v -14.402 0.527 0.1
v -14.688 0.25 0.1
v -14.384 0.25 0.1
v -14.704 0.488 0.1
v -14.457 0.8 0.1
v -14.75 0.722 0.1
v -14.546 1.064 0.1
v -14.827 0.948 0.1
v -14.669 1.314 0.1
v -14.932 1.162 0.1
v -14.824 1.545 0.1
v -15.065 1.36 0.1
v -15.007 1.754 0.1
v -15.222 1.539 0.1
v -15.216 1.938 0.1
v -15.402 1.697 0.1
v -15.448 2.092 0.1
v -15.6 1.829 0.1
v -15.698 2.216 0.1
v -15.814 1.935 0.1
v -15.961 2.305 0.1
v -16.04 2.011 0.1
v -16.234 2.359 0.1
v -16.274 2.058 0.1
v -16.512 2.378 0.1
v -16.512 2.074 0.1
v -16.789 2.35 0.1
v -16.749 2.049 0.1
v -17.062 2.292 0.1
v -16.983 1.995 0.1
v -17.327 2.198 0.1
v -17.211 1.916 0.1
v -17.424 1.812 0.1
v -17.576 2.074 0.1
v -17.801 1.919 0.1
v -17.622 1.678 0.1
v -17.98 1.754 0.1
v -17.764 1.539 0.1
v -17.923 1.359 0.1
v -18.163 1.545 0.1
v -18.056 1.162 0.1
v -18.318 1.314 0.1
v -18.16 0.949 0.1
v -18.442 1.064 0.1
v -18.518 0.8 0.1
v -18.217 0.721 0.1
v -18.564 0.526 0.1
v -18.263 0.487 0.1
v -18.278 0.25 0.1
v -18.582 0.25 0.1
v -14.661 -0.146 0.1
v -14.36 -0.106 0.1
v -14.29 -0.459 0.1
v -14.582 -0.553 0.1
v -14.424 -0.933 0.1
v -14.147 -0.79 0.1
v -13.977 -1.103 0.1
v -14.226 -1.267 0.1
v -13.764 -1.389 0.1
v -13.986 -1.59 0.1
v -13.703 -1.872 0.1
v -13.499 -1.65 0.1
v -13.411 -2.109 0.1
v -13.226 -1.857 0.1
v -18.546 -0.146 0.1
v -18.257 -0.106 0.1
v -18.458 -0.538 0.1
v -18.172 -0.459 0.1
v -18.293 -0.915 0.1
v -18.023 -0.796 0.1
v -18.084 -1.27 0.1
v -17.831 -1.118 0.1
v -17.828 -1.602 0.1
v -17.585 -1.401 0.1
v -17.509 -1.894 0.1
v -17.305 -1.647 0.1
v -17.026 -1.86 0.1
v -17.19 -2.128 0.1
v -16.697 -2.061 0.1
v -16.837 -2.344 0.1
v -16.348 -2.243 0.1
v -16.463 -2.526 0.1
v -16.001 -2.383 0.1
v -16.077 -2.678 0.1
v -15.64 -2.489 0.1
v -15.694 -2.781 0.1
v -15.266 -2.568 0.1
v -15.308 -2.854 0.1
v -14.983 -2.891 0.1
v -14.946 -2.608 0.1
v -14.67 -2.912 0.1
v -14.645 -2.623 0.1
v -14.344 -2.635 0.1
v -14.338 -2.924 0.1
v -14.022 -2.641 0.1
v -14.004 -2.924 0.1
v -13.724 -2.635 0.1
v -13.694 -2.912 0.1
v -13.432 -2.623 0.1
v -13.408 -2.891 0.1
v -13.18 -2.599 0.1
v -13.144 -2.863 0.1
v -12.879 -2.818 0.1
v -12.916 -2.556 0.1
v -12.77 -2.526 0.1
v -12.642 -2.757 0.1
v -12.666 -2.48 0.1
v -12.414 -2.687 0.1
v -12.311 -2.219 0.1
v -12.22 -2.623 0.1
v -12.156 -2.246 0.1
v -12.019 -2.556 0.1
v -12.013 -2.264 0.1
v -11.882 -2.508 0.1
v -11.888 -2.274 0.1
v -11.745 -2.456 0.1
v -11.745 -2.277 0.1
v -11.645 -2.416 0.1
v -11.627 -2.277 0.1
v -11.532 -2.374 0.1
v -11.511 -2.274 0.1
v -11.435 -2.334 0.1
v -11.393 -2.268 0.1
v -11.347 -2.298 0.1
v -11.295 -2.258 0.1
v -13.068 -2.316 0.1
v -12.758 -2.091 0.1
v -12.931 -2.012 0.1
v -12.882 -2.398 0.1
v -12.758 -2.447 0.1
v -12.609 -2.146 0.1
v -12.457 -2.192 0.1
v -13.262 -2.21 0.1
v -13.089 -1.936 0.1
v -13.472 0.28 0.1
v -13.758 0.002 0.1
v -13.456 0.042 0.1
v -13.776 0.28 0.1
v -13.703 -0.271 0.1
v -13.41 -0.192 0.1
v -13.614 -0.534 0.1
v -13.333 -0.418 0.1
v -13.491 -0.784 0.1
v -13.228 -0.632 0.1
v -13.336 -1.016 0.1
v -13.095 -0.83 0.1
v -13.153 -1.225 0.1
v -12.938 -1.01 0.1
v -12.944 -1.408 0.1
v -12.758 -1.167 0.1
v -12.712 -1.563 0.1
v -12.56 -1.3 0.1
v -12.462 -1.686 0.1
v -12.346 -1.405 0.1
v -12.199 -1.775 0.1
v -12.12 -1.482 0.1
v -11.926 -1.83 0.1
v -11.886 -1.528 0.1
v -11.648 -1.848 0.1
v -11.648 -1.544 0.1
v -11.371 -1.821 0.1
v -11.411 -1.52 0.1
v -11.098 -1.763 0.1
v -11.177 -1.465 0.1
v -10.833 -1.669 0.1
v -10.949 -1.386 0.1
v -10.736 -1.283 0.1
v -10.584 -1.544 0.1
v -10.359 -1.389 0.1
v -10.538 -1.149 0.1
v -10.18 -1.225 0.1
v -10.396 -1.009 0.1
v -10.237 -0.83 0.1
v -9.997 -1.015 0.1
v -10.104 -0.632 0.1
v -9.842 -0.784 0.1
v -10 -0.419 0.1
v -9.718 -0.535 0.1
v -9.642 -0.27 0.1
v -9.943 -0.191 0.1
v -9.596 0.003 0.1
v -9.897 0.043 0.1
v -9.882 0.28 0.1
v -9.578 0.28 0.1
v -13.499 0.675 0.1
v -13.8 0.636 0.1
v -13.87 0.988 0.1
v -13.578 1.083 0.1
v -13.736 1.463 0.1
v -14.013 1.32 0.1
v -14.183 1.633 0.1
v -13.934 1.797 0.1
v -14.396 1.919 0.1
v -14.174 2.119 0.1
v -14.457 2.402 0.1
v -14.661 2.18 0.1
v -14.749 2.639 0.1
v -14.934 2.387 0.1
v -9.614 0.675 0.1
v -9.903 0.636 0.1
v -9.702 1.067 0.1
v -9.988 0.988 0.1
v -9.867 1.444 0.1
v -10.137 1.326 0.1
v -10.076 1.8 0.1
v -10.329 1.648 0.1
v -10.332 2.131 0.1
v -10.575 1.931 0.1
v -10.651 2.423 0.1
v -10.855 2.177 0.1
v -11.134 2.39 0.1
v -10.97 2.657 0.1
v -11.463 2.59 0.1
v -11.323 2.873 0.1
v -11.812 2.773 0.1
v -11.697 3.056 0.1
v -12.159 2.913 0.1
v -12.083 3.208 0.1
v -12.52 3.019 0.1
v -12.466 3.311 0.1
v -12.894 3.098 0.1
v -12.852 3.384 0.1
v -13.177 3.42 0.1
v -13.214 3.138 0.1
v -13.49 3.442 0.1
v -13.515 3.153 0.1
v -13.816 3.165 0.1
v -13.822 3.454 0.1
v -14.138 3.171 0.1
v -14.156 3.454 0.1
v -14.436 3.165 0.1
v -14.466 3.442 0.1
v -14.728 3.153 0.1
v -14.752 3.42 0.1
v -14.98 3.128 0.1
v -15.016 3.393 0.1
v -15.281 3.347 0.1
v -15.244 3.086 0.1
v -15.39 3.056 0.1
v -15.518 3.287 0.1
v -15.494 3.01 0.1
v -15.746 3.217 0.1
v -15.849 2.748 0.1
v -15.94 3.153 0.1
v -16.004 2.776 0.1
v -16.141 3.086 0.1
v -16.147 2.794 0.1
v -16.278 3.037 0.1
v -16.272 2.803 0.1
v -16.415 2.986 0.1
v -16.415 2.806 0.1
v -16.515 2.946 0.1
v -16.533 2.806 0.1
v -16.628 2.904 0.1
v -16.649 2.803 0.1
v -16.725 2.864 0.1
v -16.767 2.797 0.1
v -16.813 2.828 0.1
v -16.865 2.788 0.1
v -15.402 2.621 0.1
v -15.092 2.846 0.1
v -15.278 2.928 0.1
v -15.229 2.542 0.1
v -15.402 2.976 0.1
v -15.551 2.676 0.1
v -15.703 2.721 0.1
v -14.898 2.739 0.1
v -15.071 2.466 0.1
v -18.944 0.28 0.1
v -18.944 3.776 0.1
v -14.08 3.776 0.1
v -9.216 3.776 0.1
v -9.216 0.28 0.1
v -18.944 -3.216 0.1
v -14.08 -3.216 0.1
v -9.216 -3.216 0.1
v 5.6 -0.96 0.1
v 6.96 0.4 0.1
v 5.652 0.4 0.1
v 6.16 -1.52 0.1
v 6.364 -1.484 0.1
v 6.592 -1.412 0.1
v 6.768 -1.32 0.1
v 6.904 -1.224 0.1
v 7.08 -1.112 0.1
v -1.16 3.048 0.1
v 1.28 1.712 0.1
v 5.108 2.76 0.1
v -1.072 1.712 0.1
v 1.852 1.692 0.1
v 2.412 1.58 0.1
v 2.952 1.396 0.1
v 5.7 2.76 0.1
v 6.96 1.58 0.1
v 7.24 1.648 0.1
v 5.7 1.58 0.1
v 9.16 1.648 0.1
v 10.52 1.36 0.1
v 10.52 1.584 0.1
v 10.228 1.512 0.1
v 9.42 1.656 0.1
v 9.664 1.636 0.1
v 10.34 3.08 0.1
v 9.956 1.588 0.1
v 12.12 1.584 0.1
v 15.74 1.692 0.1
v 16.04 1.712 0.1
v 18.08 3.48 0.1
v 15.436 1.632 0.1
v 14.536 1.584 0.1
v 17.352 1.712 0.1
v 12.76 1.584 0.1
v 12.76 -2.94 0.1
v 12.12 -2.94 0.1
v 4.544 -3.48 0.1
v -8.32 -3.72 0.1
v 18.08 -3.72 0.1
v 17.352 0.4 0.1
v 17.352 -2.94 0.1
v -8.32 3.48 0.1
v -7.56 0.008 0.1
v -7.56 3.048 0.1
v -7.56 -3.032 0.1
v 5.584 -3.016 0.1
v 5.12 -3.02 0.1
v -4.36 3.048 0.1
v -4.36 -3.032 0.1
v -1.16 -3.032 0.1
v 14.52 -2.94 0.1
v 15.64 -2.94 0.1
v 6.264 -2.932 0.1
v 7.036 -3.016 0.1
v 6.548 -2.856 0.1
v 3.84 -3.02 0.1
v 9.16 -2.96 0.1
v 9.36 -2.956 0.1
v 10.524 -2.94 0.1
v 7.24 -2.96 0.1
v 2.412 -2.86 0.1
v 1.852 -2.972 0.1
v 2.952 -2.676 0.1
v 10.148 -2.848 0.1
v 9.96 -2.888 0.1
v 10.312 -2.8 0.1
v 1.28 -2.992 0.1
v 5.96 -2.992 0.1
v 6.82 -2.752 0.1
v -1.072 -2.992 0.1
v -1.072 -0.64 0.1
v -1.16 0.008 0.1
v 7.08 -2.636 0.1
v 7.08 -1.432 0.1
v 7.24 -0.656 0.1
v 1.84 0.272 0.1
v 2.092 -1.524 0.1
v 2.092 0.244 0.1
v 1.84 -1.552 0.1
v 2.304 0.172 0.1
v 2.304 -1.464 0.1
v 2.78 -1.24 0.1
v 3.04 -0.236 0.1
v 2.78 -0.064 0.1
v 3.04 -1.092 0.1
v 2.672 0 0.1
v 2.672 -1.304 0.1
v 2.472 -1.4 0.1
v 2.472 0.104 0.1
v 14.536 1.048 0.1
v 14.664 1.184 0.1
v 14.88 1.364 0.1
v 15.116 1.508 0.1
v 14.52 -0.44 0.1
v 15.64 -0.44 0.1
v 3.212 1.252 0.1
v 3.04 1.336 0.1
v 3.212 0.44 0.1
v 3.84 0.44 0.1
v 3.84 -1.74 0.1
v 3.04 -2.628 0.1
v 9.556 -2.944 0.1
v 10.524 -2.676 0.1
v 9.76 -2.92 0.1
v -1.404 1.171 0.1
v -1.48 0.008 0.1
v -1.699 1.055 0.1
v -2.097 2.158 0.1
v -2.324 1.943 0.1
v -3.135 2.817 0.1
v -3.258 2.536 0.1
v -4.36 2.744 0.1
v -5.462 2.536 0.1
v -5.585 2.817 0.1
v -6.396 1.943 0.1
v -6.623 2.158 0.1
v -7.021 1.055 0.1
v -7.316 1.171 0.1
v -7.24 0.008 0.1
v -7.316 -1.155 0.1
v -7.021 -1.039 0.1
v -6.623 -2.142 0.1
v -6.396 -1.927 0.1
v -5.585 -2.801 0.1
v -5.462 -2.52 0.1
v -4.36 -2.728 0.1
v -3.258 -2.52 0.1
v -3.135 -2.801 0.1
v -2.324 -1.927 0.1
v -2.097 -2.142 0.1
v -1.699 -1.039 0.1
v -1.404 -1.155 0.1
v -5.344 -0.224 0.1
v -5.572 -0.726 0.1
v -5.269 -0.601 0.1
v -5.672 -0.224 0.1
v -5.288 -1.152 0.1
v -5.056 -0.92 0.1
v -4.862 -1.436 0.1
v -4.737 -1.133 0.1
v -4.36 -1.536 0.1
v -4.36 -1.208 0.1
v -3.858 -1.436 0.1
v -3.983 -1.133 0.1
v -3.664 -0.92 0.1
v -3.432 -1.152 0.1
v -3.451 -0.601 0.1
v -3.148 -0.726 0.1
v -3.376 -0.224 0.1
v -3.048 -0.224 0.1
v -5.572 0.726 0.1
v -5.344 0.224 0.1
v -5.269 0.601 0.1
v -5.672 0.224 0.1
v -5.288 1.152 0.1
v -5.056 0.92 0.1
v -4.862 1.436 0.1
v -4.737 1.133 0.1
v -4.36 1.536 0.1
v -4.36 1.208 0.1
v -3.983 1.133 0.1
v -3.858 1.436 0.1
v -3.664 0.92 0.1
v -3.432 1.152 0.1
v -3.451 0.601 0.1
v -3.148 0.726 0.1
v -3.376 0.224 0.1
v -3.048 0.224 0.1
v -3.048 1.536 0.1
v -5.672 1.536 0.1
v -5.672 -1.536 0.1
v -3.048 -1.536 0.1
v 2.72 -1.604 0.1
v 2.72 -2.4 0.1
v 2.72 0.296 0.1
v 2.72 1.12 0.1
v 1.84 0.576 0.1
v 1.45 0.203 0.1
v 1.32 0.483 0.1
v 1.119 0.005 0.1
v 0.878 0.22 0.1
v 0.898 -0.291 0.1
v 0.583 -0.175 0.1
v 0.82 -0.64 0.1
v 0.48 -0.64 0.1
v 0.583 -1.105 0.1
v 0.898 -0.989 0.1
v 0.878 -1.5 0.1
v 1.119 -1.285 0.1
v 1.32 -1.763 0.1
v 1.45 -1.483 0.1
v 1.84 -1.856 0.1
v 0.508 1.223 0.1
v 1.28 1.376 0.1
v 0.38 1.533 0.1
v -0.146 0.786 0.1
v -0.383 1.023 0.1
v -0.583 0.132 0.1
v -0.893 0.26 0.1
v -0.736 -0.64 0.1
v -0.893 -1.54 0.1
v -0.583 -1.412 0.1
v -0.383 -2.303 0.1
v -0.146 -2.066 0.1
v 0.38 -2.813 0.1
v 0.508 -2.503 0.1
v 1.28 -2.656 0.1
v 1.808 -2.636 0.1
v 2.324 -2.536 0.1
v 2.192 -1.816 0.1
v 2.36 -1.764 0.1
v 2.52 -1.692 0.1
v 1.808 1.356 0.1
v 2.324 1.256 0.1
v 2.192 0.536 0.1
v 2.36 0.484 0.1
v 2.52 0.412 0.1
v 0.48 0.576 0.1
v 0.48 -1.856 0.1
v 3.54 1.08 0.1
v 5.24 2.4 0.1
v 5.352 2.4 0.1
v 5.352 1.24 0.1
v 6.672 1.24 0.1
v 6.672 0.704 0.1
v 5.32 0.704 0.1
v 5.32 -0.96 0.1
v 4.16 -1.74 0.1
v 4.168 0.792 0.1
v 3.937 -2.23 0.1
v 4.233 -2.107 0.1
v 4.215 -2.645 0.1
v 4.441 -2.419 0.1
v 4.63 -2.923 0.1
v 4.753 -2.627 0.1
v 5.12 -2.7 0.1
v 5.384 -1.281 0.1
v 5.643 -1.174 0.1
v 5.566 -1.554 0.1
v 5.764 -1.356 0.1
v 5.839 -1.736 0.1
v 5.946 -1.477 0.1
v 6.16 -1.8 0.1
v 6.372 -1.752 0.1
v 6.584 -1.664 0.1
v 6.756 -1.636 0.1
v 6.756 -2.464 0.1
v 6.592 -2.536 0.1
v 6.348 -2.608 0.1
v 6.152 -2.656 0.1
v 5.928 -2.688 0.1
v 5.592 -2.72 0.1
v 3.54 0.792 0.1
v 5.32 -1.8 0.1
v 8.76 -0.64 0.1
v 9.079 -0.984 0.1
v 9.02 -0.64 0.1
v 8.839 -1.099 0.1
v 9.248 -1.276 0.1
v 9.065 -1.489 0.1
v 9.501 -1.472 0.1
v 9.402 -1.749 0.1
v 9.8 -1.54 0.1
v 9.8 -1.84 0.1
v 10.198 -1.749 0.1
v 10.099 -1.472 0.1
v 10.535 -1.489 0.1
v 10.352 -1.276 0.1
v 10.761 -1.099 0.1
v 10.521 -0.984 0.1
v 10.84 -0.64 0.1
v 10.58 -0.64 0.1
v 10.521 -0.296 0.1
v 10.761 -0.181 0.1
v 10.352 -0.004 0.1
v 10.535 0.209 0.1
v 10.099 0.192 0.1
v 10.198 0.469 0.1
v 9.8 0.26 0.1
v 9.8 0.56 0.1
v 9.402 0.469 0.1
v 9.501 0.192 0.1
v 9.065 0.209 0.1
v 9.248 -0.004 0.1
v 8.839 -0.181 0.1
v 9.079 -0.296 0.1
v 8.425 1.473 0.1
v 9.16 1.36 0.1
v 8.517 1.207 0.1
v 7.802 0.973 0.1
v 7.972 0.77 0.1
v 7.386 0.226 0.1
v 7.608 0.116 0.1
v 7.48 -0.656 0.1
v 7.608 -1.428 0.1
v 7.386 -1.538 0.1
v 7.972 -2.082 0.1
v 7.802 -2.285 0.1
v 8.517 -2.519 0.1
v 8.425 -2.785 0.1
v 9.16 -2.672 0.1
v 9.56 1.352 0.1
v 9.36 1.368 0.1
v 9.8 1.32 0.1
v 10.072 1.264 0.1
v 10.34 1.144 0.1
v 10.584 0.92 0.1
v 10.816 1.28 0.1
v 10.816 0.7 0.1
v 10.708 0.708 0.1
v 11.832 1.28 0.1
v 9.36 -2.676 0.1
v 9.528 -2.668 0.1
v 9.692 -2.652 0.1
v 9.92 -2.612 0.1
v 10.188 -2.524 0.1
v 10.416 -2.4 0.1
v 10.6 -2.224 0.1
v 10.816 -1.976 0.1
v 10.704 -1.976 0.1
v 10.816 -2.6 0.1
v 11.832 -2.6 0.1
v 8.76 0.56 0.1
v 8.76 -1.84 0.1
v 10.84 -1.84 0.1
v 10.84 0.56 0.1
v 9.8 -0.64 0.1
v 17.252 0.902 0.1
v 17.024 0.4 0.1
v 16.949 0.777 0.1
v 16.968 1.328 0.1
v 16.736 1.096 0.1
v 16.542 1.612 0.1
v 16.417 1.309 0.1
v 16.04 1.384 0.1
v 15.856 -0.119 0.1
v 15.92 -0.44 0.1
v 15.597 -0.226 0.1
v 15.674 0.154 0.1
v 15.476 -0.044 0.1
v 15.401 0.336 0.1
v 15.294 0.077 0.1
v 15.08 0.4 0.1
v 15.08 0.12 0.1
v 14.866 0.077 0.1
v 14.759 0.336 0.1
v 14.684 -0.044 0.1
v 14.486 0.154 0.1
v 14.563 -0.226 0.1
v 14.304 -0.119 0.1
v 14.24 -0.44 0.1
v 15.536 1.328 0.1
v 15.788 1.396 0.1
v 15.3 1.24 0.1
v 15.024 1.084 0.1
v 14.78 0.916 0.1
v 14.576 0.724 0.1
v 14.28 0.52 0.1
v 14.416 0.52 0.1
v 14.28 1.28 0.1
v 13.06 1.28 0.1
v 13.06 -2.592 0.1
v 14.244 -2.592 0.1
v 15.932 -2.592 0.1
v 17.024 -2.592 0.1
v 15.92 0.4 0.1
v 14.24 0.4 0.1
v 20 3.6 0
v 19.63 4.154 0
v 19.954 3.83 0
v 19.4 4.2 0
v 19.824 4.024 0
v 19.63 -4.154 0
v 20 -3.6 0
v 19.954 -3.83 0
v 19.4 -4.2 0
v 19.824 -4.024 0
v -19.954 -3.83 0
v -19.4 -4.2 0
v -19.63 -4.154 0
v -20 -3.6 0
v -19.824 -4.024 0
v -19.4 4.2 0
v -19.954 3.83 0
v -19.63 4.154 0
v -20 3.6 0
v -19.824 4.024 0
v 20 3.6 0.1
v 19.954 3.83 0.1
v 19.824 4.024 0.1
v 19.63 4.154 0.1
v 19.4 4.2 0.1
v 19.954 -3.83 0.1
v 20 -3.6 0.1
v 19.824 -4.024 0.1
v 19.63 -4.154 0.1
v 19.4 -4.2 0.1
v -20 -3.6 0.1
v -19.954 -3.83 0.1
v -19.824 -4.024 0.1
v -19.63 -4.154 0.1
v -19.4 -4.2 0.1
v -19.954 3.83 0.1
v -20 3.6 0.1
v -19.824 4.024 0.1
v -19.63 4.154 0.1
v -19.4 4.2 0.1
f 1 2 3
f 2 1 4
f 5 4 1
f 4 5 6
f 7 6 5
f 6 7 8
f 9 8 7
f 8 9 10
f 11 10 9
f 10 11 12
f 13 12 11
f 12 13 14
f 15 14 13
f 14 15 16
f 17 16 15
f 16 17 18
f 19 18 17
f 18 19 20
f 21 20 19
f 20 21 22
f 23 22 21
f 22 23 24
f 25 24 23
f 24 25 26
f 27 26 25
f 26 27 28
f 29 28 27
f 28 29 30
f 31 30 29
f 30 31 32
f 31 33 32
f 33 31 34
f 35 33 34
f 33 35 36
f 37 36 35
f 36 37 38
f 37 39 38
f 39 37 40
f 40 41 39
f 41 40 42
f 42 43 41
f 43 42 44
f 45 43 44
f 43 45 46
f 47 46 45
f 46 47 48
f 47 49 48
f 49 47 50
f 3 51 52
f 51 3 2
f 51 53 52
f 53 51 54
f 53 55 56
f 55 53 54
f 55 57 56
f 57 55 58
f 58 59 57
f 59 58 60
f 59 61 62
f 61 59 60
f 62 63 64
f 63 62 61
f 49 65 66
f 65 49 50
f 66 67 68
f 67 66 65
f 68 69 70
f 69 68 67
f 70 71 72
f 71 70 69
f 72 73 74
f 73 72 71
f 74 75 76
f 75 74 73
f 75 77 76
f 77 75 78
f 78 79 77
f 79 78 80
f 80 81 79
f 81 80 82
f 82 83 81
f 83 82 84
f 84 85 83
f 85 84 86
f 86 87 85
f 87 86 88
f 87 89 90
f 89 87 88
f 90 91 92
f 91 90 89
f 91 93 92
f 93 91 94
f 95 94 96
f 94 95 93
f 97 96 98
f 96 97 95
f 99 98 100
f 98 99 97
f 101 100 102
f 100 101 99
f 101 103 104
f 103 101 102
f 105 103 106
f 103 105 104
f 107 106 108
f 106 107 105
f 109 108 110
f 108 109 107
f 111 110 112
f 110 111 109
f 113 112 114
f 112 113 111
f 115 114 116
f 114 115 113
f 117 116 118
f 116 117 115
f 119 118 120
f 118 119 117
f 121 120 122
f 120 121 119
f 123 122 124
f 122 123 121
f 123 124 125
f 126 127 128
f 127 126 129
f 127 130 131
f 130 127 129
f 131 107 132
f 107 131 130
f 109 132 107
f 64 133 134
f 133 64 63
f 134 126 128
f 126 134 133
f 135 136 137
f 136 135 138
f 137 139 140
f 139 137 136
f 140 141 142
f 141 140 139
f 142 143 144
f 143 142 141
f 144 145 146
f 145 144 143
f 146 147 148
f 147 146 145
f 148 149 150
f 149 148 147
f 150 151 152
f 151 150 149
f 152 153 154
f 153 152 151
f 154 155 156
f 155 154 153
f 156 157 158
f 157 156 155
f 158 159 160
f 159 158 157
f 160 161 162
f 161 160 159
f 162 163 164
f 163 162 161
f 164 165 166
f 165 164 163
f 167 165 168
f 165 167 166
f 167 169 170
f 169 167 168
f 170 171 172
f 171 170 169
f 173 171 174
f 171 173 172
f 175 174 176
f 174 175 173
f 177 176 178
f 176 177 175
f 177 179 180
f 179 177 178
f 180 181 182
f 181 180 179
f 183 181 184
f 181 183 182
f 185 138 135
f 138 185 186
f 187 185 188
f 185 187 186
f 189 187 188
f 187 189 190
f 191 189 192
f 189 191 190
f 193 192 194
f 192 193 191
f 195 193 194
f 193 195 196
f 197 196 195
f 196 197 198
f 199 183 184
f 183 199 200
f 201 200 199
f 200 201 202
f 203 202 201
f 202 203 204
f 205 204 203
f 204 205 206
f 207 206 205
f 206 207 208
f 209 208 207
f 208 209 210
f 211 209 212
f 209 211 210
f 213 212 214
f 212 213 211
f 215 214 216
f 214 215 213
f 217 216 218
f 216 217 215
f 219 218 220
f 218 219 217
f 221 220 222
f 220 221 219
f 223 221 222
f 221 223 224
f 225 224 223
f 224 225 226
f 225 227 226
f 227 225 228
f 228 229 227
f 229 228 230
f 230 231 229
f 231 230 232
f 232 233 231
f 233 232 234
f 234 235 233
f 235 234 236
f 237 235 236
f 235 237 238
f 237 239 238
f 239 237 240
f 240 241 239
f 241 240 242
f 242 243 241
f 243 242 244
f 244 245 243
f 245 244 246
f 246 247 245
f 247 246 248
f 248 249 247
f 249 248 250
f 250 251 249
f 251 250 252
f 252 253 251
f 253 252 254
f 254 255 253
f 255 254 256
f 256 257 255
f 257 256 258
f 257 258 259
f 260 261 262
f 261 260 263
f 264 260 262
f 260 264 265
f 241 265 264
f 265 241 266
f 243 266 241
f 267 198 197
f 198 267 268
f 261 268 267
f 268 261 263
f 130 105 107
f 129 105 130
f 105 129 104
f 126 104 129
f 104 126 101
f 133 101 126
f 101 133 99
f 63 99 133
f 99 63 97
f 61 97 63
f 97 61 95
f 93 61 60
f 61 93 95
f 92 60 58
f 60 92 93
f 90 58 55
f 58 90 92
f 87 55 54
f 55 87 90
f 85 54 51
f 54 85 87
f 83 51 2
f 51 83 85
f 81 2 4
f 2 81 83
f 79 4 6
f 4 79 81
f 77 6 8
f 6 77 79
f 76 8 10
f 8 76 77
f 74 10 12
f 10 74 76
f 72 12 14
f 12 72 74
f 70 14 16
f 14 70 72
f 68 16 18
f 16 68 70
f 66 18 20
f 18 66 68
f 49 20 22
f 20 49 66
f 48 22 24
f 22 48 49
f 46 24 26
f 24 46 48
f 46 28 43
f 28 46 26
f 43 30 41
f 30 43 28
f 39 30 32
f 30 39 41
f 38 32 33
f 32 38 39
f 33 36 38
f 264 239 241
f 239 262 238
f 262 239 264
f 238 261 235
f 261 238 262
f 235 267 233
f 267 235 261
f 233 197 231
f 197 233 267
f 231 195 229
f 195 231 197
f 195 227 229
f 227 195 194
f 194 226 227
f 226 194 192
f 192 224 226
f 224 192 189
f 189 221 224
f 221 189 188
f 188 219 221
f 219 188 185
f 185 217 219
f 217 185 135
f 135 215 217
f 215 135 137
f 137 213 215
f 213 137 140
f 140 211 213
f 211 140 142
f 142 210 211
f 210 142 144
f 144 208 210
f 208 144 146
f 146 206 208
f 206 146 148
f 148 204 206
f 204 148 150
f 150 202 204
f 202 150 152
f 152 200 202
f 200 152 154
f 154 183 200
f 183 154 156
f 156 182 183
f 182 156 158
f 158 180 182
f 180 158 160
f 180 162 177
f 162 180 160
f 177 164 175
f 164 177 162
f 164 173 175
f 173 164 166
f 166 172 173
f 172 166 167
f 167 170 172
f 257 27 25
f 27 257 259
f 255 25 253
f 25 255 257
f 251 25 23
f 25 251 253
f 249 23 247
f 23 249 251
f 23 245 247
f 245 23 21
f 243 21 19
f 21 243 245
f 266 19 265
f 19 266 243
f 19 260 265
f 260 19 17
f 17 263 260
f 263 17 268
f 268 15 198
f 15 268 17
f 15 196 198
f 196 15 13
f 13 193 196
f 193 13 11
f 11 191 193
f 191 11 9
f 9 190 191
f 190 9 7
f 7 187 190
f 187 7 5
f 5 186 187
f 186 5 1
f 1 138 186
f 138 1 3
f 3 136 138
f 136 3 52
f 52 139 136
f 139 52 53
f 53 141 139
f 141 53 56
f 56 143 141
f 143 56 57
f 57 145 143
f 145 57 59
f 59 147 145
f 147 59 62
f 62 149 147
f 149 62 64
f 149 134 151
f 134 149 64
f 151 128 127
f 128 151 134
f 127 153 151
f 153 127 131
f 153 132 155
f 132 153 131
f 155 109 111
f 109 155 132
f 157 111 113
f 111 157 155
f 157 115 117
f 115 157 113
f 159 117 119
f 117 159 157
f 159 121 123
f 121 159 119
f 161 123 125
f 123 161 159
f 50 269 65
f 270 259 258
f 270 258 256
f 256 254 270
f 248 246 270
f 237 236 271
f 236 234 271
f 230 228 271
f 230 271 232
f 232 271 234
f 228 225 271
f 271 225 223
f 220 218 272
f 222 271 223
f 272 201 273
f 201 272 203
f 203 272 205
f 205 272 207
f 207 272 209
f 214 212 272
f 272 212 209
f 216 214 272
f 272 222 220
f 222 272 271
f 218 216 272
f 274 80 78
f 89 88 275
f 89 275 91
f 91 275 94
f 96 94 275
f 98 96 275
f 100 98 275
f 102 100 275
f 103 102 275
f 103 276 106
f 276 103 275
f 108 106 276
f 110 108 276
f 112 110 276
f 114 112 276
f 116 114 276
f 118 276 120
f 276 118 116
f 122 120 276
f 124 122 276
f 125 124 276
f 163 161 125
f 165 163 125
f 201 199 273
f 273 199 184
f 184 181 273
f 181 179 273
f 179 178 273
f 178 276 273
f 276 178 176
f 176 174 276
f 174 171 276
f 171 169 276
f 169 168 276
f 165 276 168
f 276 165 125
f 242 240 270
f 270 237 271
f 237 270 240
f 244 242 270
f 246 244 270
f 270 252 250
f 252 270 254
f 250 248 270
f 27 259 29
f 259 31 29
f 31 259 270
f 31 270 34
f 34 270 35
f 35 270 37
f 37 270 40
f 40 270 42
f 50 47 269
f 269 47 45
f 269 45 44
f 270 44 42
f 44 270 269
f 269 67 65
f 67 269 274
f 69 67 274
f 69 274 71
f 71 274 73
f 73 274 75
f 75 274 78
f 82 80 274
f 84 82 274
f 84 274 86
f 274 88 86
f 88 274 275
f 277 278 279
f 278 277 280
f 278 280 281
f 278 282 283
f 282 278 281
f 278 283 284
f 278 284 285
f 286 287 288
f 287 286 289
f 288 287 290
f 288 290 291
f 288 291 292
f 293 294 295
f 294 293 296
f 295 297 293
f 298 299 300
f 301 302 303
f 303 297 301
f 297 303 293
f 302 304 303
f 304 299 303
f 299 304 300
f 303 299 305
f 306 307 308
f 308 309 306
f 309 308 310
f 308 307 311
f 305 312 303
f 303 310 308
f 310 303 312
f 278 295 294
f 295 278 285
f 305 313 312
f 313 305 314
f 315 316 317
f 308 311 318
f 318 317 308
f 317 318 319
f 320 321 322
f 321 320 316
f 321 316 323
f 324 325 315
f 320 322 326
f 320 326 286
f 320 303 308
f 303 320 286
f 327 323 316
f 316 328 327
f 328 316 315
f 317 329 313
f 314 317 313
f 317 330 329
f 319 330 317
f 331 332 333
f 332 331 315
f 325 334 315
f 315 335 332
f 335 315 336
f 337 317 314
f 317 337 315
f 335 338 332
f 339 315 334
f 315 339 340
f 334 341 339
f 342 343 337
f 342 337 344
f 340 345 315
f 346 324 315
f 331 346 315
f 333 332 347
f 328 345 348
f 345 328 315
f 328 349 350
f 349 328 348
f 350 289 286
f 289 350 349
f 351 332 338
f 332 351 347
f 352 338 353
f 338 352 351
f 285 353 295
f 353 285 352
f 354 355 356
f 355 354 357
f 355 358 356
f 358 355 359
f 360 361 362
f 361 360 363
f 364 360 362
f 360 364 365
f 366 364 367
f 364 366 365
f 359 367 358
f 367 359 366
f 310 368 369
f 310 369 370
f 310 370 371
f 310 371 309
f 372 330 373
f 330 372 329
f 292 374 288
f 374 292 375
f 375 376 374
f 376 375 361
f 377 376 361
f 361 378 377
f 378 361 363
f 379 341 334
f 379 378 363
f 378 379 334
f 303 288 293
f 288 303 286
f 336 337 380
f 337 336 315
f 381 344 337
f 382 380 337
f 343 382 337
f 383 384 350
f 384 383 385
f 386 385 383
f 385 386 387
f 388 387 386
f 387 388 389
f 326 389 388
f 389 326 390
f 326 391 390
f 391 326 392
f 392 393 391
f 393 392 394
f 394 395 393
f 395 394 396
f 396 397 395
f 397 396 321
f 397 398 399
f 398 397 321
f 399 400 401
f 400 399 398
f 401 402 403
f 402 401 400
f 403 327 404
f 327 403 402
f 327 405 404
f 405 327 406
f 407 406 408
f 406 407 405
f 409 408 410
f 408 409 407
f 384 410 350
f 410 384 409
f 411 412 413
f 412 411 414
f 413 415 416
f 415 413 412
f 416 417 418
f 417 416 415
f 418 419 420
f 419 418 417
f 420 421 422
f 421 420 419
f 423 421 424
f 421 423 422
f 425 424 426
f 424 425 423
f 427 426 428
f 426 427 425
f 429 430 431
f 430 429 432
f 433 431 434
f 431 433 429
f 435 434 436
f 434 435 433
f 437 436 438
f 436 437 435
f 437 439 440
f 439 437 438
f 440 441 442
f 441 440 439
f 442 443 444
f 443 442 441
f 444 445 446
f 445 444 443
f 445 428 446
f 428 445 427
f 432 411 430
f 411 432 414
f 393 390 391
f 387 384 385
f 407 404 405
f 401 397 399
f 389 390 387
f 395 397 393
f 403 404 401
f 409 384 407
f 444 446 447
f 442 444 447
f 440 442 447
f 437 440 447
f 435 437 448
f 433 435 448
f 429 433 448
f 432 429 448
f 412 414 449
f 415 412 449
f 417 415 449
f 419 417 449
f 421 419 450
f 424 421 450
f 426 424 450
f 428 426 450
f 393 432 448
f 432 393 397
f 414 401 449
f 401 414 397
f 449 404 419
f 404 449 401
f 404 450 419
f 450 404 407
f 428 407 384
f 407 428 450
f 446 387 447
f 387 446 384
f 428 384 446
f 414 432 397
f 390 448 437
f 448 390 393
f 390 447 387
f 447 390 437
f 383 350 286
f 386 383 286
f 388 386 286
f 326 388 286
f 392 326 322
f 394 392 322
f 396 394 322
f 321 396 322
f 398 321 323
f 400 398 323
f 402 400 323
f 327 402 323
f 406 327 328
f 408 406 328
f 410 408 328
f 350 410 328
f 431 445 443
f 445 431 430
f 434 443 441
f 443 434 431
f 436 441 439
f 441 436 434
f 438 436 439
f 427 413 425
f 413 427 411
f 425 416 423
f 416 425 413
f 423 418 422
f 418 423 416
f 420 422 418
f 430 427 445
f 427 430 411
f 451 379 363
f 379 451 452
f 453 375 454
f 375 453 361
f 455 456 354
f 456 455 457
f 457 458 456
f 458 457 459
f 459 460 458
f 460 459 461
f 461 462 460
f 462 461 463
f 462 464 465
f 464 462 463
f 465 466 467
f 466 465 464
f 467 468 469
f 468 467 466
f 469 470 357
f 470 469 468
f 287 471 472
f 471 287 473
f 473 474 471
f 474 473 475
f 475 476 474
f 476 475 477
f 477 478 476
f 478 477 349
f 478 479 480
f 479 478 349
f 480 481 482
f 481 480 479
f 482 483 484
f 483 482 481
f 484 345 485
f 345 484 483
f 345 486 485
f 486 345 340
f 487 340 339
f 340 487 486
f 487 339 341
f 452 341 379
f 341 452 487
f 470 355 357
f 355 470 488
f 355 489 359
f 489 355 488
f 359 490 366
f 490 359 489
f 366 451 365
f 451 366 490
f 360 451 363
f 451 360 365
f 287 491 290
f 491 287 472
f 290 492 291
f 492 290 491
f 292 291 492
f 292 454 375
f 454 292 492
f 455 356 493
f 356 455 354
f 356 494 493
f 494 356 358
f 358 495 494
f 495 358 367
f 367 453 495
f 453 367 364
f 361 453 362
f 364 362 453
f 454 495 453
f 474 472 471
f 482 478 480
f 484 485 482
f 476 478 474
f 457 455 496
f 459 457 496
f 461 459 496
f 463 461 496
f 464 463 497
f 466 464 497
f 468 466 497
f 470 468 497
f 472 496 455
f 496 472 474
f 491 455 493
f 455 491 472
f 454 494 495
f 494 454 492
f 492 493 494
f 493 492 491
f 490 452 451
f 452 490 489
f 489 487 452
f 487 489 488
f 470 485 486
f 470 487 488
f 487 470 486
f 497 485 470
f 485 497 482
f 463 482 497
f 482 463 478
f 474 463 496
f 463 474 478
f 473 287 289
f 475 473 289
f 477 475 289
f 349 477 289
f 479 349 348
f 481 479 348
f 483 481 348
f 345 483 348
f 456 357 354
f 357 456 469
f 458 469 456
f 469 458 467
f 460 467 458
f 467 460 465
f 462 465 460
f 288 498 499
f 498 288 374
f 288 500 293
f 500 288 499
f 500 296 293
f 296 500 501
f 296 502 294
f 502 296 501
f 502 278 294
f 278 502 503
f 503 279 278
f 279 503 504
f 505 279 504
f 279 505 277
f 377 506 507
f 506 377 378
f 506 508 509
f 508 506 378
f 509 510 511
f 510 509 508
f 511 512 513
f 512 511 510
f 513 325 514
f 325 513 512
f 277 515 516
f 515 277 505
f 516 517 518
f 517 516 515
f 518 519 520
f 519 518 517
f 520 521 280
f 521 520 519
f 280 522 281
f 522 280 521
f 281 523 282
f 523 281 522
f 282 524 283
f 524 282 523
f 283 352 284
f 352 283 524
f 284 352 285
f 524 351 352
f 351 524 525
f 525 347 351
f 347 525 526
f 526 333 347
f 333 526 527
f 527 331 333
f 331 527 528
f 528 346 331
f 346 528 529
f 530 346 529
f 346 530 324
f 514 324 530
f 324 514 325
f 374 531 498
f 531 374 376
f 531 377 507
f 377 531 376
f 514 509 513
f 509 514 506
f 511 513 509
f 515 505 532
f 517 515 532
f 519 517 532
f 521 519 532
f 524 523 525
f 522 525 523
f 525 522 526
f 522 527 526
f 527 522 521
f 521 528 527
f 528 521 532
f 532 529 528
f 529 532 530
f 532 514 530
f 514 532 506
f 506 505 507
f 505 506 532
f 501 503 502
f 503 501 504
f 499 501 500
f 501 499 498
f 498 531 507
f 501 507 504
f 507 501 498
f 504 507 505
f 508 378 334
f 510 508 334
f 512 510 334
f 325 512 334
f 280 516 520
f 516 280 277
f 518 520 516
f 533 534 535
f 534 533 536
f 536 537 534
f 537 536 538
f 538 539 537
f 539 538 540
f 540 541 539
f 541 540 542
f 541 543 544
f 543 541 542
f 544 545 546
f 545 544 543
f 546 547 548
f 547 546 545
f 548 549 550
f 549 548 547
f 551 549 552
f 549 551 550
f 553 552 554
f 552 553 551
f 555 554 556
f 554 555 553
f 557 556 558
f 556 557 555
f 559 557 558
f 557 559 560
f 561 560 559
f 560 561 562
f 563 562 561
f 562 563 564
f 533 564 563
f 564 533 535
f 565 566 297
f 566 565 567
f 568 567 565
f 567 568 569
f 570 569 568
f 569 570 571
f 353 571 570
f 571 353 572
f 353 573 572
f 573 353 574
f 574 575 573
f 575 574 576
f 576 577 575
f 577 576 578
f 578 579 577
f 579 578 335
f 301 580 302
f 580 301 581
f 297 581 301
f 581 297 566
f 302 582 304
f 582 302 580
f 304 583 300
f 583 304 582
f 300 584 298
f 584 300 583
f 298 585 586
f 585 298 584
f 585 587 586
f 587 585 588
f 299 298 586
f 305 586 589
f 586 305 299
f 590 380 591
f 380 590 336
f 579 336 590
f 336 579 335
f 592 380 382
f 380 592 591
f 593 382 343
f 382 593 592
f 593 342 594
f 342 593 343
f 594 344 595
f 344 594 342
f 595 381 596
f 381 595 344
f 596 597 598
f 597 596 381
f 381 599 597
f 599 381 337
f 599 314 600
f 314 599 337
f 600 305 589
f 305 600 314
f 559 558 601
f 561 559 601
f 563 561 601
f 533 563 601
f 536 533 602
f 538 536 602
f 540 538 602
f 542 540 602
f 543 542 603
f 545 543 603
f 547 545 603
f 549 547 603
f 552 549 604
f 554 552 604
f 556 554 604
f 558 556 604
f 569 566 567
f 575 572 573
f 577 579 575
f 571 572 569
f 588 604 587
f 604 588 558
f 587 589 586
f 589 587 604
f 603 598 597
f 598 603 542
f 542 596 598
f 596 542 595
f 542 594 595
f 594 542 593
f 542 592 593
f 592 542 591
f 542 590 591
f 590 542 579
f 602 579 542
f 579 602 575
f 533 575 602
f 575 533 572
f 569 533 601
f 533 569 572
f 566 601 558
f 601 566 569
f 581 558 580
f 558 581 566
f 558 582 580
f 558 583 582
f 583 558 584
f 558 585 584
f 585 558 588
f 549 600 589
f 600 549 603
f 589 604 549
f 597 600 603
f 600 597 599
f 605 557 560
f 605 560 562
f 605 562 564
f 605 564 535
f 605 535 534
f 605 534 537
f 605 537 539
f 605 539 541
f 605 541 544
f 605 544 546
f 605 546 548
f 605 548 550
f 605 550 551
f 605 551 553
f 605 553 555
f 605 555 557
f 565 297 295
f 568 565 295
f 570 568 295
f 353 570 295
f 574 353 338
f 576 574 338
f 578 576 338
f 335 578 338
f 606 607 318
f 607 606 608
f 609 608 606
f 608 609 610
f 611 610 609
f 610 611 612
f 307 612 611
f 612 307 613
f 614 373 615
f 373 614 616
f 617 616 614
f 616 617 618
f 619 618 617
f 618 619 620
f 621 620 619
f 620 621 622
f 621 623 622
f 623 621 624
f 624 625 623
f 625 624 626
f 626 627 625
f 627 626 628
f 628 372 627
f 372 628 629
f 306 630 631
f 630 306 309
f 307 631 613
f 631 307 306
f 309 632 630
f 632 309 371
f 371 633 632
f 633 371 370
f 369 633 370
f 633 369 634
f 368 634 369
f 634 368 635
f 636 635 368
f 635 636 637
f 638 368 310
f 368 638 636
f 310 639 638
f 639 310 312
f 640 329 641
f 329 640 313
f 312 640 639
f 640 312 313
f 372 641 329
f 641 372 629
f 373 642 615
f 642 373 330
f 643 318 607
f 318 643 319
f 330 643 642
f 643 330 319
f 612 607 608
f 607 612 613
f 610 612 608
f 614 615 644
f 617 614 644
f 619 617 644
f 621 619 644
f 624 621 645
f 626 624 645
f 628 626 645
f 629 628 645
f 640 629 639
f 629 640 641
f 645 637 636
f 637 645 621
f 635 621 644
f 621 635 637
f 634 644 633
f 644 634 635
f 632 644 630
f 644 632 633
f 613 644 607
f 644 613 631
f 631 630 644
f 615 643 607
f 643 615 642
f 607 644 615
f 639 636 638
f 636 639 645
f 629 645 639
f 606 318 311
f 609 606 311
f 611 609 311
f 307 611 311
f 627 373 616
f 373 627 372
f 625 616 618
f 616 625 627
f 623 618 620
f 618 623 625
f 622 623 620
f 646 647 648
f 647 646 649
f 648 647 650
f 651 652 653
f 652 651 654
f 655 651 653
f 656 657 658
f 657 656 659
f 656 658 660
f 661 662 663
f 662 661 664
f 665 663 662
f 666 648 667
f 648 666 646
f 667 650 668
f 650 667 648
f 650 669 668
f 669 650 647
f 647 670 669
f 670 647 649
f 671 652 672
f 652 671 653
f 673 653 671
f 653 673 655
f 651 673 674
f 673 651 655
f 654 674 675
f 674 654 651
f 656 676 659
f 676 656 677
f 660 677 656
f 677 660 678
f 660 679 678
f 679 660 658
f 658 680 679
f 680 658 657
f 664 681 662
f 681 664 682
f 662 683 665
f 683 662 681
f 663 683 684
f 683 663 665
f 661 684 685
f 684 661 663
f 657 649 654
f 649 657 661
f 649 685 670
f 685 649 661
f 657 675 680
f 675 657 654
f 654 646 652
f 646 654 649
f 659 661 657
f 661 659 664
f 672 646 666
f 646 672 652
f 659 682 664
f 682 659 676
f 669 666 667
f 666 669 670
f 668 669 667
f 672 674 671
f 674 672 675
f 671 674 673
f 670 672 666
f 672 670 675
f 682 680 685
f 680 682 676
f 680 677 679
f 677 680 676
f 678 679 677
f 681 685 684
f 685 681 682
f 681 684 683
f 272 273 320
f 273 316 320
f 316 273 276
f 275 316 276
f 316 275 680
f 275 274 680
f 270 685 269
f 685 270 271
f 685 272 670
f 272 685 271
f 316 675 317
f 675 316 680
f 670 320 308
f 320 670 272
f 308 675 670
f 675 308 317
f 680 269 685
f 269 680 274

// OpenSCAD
use <../lib.scad>
use <../p/1-4chrd.scad>
use <../p/1-4cyli.scad>
use <../p/box3u12.scad>
use <../p/logo-octan.scad>
use <../p/logo-octantext.scad>
$fa=1; $fs=0.2;
function ldraw_lib__4121723h(realsolid=false) = [
// 0 Sticker  1.05 x  5.0 with Octan Logo and Lettering with Medium-Bold Borders
// 0 Name: 4121723h.dat
// 0 Author: Ulrich Röder [UR]
// 0 !LDRAW_ORG Part UPDATE 2022-05
// 0 !LICENSE Licensed under CC BY 2.0 and CC BY 4.0 : see CAreadme.txt
// 
// 0 BFC CERTIFY CCW
  [0,"BFC","CERTIFY"],
  [0,"BFC","CCW"],
// 
// 0 !KEYWORDS Model Team, Racing Truck, Set 5563
// 
// 0 !HISTORY 2022-09-15 [PTadmin] Official Update 2022-05
// 
// 
// 1 16 -35.2 -.25 .7 .76 0 0 0 1 0 0 0 .76 logo-octan.dat
  [1,16,-35.2,-.25,.7,.76,0,0,0,1,0,0,0,.76, ldraw_lib__logo_octan(realsolid)],
// 1 16 12.2 -.25 -.3 1 0 0 0 1 0 0 0 1 logo-octantext.dat
  [1,16,12.2,-.25,-.3,1,0,0,0,1,0,0,0,1, ldraw_lib__logo_octantext(realsolid)],
// 
// 0 // Body
// 1 16 48.5 0 9 1.5 0 0 0 -1 0 0 0 1.5 1-4chrd.dat
  [1,16,48.5,0,9,1.5,0,0,0,-1,0,0,0,1.5, ldraw_lib__1_4chrd(realsolid)],
// 1 16 48.5 0 -9 1.5 0 0 0 -1 0 0 0 -1.5 1-4chrd.dat
  [1,16,48.5,0,-9,1.5,0,0,0,-1,0,0,0,-1.5, ldraw_lib__1_4chrd(realsolid)],
// 1 16 -48.5 0 -9 -1.5 0 0 0 -1 0 0 0 -1.5 1-4chrd.dat
  [1,16,-48.5,0,-9,-1.5,0,0,0,-1,0,0,0,-1.5, ldraw_lib__1_4chrd(realsolid)],
// 1 16 -48.5 0 9 -1.5 0 0 0 -1 0 0 0 1.5 1-4chrd.dat
  [1,16,-48.5,0,9,-1.5,0,0,0,-1,0,0,0,1.5, ldraw_lib__1_4chrd(realsolid)],
// 1 16 48.5 0 9 1.5 0 0 0 -.25 0 0 0 1.5 1-4cyli.dat
  [1,16,48.5,0,9,1.5,0,0,0,-.25,0,0,0,1.5, ldraw_lib__1_4cyli(realsolid)],
// 1 16 48.5 0 -9 1.5 0 0 0 -.25 0 0 0 -1.5 1-4cyli.dat
  [1,16,48.5,0,-9,1.5,0,0,0,-.25,0,0,0,-1.5, ldraw_lib__1_4cyli(realsolid)],
// 1 16 -48.5 0 -9 -1.5 0 0 0 -.25 0 0 0 -1.5 1-4cyli.dat
  [1,16,-48.5,0,-9,-1.5,0,0,0,-.25,0,0,0,-1.5, ldraw_lib__1_4cyli(realsolid)],
// 1 16 -48.5 0 9 -1.5 0 0 0 -.25 0 0 0 1.5 1-4cyli.dat
  [1,16,-48.5,0,9,-1.5,0,0,0,-.25,0,0,0,1.5, ldraw_lib__1_4cyli(realsolid)],
// 1 16 0 -.25 0 48.5 0 0 0 .25 0 0 0 10.5 box3u12.dat
  [1,16,0,-.25,0,48.5,0,0,0,.25,0,0,0,10.5, ldraw_lib__box3u12(realsolid)],
// 4 16 48.5 0 10.5 50 0 9 50 0 -9 48.5 0 -10.5
  [4,16,48.5,0,10.5,50,0,9,50,0,-9,48.5,0,-10.5],
// 4 16 -50 0 -9 -50 0 9 -48.5 0 10.5 -48.5 0 -10.5
  [4,16,-50,0,-9,-50,0,9,-48.5,0,10.5,-48.5,0,-10.5],
// 4 16 50 0 -9 50 0 9 50 -.25 9 50 -.25 -9
  [4,16,50,0,-9,50,0,9,50,-.25,9,50,-.25,-9],
// 4 16 -50 -.25 9 -50 0 9 -50 0 -9 -50 -.25 -9
  [4,16,-50,-.25,9,-50,0,9,-50,0,-9,-50,-.25,-9],
// 
// 0 // Frontface Cutout
// 1 16 48.5 -.25 9 1.5 0 0 0 1 0 0 0 1.5 1-4chrd.dat
  [1,16,48.5,-.25,9,1.5,0,0,0,1,0,0,0,1.5, ldraw_lib__1_4chrd(realsolid)],
// 1 16 48.5 -.25 -9 1.5 0 0 0 1 0 0 0 -1.5 1-4chrd.dat
  [1,16,48.5,-.25,-9,1.5,0,0,0,1,0,0,0,-1.5, ldraw_lib__1_4chrd(realsolid)],
// 4 16 50 -.25 -9 50 -.25 9 48.5 -.25 10.5 48.5 -.25 -10.5
  [4,16,50,-.25,-9,50,-.25,9,48.5,-.25,10.5,48.5,-.25,-10.5],
// 4 16 -48.5 -.25 10.5 -50 -.25 9 -50 -.25 -9 -48.5 -.25 -10.5
  [4,16,-48.5,-.25,10.5,-50,-.25,9,-50,-.25,-9,-48.5,-.25,-10.5],
// 1 16 -48.5 -.25 -9 -1.5 0 0 0 1 0 0 0 -1.5 1-4chrd.dat
  [1,16,-48.5,-.25,-9,-1.5,0,0,0,1,0,0,0,-1.5, ldraw_lib__1_4chrd(realsolid)],
// 1 16 -48.5 -.25 9 -1.5 0 0 0 1 0 0 0 1.5 1-4chrd.dat
  [1,16,-48.5,-.25,9,-1.5,0,0,0,1,0,0,0,1.5, ldraw_lib__1_4chrd(realsolid)],
// 3 16 -23.04 -.25 9.44 -23.04 -.25 .7 -20.8 -.25 8.7
  [3,16,-23.04,-.25,9.44,-23.04,-.25,.7,-20.8,-.25,8.7],
// 4 16 -20.8 -.25 -9.3 -20.8 -.25 8.7 -23.04 -.25 .7 -23.04 -.25 -8.04
  [4,16,-20.8,-.25,-9.3,-20.8,-.25,8.7,-23.04,-.25,.7,-23.04,-.25,-8.04],
// 4 16 -48.5 -.25 -10.5 -20.8 -.25 -9.3 -23.04 -.25 -8.04 -35.2 -.25 -8.04
  [4,16,-48.5,-.25,-10.5,-20.8,-.25,-9.3,-23.04,-.25,-8.04,-35.2,-.25,-8.04],
// 3 16 -35.2 -.25 -8.04 -47.36 -.25 -8.04 -48.5 -.25 -10.5
  [3,16,-35.2,-.25,-8.04,-47.36,-.25,-8.04,-48.5,-.25,-10.5],
// 3 16 -47.36 -.25 9.44 -48.5 -.25 10.5 -47.36 -.25 .7
  [3,16,-47.36,-.25,9.44,-48.5,-.25,10.5,-47.36,-.25,.7],
// 3 16 -48.5 -.25 10.5 -47.36 -.25 9.44 -35.2 -.25 9.44
  [3,16,-48.5,-.25,10.5,-47.36,-.25,9.44,-35.2,-.25,9.44],
// 4 16 48.5 -.25 10.5 -48.5 -.25 10.5 -35.2 -.25 9.44 -23.04 -.25 9.44
  [4,16,48.5,-.25,10.5,-48.5,-.25,10.5,-35.2,-.25,9.44,-23.04,-.25,9.44],
// 4 16 45.2 -.25 -9.3 -20.8 -.25 -9.3 -48.5 -.25 -10.5 48.5 -.25 -10.5
  [4,16,45.2,-.25,-9.3,-20.8,-.25,-9.3,-48.5,-.25,-10.5,48.5,-.25,-10.5],
// 4 16 -20.8 -.25 8.7 45.2 -.25 8.7 48.5 -.25 10.5 -23.04 -.25 9.44
  [4,16,-20.8,-.25,8.7,45.2,-.25,8.7,48.5,-.25,10.5,-23.04,-.25,9.44],
// 4 16 45.2 -.25 8.7 45.2 -.25 -9.3 48.5 -.25 -10.5 48.5 -.25 10.5
  [4,16,45.2,-.25,8.7,45.2,-.25,-9.3,48.5,-.25,-10.5,48.5,-.25,10.5],
// 4 16 -47.36 -.25 -8.04 -47.36 -.25 .7 -48.5 -.25 10.5 -48.5 -.25 -10.5
  [4,16,-47.36,-.25,-8.04,-47.36,-.25,.7,-48.5,-.25,10.5,-48.5,-.25,-10.5],
// 
];
module ldraw_lib__4121723h(step=0, col=false, unit=2/5, alt=false, line=0.2, solid=!$preview)
    makepoly(ldraw_lib__4121723h(solid), step=step, col=col, unit=unit, alt=alt, line=line, solid=solid);
ldraw_lib__4121723h(line=0.2);
